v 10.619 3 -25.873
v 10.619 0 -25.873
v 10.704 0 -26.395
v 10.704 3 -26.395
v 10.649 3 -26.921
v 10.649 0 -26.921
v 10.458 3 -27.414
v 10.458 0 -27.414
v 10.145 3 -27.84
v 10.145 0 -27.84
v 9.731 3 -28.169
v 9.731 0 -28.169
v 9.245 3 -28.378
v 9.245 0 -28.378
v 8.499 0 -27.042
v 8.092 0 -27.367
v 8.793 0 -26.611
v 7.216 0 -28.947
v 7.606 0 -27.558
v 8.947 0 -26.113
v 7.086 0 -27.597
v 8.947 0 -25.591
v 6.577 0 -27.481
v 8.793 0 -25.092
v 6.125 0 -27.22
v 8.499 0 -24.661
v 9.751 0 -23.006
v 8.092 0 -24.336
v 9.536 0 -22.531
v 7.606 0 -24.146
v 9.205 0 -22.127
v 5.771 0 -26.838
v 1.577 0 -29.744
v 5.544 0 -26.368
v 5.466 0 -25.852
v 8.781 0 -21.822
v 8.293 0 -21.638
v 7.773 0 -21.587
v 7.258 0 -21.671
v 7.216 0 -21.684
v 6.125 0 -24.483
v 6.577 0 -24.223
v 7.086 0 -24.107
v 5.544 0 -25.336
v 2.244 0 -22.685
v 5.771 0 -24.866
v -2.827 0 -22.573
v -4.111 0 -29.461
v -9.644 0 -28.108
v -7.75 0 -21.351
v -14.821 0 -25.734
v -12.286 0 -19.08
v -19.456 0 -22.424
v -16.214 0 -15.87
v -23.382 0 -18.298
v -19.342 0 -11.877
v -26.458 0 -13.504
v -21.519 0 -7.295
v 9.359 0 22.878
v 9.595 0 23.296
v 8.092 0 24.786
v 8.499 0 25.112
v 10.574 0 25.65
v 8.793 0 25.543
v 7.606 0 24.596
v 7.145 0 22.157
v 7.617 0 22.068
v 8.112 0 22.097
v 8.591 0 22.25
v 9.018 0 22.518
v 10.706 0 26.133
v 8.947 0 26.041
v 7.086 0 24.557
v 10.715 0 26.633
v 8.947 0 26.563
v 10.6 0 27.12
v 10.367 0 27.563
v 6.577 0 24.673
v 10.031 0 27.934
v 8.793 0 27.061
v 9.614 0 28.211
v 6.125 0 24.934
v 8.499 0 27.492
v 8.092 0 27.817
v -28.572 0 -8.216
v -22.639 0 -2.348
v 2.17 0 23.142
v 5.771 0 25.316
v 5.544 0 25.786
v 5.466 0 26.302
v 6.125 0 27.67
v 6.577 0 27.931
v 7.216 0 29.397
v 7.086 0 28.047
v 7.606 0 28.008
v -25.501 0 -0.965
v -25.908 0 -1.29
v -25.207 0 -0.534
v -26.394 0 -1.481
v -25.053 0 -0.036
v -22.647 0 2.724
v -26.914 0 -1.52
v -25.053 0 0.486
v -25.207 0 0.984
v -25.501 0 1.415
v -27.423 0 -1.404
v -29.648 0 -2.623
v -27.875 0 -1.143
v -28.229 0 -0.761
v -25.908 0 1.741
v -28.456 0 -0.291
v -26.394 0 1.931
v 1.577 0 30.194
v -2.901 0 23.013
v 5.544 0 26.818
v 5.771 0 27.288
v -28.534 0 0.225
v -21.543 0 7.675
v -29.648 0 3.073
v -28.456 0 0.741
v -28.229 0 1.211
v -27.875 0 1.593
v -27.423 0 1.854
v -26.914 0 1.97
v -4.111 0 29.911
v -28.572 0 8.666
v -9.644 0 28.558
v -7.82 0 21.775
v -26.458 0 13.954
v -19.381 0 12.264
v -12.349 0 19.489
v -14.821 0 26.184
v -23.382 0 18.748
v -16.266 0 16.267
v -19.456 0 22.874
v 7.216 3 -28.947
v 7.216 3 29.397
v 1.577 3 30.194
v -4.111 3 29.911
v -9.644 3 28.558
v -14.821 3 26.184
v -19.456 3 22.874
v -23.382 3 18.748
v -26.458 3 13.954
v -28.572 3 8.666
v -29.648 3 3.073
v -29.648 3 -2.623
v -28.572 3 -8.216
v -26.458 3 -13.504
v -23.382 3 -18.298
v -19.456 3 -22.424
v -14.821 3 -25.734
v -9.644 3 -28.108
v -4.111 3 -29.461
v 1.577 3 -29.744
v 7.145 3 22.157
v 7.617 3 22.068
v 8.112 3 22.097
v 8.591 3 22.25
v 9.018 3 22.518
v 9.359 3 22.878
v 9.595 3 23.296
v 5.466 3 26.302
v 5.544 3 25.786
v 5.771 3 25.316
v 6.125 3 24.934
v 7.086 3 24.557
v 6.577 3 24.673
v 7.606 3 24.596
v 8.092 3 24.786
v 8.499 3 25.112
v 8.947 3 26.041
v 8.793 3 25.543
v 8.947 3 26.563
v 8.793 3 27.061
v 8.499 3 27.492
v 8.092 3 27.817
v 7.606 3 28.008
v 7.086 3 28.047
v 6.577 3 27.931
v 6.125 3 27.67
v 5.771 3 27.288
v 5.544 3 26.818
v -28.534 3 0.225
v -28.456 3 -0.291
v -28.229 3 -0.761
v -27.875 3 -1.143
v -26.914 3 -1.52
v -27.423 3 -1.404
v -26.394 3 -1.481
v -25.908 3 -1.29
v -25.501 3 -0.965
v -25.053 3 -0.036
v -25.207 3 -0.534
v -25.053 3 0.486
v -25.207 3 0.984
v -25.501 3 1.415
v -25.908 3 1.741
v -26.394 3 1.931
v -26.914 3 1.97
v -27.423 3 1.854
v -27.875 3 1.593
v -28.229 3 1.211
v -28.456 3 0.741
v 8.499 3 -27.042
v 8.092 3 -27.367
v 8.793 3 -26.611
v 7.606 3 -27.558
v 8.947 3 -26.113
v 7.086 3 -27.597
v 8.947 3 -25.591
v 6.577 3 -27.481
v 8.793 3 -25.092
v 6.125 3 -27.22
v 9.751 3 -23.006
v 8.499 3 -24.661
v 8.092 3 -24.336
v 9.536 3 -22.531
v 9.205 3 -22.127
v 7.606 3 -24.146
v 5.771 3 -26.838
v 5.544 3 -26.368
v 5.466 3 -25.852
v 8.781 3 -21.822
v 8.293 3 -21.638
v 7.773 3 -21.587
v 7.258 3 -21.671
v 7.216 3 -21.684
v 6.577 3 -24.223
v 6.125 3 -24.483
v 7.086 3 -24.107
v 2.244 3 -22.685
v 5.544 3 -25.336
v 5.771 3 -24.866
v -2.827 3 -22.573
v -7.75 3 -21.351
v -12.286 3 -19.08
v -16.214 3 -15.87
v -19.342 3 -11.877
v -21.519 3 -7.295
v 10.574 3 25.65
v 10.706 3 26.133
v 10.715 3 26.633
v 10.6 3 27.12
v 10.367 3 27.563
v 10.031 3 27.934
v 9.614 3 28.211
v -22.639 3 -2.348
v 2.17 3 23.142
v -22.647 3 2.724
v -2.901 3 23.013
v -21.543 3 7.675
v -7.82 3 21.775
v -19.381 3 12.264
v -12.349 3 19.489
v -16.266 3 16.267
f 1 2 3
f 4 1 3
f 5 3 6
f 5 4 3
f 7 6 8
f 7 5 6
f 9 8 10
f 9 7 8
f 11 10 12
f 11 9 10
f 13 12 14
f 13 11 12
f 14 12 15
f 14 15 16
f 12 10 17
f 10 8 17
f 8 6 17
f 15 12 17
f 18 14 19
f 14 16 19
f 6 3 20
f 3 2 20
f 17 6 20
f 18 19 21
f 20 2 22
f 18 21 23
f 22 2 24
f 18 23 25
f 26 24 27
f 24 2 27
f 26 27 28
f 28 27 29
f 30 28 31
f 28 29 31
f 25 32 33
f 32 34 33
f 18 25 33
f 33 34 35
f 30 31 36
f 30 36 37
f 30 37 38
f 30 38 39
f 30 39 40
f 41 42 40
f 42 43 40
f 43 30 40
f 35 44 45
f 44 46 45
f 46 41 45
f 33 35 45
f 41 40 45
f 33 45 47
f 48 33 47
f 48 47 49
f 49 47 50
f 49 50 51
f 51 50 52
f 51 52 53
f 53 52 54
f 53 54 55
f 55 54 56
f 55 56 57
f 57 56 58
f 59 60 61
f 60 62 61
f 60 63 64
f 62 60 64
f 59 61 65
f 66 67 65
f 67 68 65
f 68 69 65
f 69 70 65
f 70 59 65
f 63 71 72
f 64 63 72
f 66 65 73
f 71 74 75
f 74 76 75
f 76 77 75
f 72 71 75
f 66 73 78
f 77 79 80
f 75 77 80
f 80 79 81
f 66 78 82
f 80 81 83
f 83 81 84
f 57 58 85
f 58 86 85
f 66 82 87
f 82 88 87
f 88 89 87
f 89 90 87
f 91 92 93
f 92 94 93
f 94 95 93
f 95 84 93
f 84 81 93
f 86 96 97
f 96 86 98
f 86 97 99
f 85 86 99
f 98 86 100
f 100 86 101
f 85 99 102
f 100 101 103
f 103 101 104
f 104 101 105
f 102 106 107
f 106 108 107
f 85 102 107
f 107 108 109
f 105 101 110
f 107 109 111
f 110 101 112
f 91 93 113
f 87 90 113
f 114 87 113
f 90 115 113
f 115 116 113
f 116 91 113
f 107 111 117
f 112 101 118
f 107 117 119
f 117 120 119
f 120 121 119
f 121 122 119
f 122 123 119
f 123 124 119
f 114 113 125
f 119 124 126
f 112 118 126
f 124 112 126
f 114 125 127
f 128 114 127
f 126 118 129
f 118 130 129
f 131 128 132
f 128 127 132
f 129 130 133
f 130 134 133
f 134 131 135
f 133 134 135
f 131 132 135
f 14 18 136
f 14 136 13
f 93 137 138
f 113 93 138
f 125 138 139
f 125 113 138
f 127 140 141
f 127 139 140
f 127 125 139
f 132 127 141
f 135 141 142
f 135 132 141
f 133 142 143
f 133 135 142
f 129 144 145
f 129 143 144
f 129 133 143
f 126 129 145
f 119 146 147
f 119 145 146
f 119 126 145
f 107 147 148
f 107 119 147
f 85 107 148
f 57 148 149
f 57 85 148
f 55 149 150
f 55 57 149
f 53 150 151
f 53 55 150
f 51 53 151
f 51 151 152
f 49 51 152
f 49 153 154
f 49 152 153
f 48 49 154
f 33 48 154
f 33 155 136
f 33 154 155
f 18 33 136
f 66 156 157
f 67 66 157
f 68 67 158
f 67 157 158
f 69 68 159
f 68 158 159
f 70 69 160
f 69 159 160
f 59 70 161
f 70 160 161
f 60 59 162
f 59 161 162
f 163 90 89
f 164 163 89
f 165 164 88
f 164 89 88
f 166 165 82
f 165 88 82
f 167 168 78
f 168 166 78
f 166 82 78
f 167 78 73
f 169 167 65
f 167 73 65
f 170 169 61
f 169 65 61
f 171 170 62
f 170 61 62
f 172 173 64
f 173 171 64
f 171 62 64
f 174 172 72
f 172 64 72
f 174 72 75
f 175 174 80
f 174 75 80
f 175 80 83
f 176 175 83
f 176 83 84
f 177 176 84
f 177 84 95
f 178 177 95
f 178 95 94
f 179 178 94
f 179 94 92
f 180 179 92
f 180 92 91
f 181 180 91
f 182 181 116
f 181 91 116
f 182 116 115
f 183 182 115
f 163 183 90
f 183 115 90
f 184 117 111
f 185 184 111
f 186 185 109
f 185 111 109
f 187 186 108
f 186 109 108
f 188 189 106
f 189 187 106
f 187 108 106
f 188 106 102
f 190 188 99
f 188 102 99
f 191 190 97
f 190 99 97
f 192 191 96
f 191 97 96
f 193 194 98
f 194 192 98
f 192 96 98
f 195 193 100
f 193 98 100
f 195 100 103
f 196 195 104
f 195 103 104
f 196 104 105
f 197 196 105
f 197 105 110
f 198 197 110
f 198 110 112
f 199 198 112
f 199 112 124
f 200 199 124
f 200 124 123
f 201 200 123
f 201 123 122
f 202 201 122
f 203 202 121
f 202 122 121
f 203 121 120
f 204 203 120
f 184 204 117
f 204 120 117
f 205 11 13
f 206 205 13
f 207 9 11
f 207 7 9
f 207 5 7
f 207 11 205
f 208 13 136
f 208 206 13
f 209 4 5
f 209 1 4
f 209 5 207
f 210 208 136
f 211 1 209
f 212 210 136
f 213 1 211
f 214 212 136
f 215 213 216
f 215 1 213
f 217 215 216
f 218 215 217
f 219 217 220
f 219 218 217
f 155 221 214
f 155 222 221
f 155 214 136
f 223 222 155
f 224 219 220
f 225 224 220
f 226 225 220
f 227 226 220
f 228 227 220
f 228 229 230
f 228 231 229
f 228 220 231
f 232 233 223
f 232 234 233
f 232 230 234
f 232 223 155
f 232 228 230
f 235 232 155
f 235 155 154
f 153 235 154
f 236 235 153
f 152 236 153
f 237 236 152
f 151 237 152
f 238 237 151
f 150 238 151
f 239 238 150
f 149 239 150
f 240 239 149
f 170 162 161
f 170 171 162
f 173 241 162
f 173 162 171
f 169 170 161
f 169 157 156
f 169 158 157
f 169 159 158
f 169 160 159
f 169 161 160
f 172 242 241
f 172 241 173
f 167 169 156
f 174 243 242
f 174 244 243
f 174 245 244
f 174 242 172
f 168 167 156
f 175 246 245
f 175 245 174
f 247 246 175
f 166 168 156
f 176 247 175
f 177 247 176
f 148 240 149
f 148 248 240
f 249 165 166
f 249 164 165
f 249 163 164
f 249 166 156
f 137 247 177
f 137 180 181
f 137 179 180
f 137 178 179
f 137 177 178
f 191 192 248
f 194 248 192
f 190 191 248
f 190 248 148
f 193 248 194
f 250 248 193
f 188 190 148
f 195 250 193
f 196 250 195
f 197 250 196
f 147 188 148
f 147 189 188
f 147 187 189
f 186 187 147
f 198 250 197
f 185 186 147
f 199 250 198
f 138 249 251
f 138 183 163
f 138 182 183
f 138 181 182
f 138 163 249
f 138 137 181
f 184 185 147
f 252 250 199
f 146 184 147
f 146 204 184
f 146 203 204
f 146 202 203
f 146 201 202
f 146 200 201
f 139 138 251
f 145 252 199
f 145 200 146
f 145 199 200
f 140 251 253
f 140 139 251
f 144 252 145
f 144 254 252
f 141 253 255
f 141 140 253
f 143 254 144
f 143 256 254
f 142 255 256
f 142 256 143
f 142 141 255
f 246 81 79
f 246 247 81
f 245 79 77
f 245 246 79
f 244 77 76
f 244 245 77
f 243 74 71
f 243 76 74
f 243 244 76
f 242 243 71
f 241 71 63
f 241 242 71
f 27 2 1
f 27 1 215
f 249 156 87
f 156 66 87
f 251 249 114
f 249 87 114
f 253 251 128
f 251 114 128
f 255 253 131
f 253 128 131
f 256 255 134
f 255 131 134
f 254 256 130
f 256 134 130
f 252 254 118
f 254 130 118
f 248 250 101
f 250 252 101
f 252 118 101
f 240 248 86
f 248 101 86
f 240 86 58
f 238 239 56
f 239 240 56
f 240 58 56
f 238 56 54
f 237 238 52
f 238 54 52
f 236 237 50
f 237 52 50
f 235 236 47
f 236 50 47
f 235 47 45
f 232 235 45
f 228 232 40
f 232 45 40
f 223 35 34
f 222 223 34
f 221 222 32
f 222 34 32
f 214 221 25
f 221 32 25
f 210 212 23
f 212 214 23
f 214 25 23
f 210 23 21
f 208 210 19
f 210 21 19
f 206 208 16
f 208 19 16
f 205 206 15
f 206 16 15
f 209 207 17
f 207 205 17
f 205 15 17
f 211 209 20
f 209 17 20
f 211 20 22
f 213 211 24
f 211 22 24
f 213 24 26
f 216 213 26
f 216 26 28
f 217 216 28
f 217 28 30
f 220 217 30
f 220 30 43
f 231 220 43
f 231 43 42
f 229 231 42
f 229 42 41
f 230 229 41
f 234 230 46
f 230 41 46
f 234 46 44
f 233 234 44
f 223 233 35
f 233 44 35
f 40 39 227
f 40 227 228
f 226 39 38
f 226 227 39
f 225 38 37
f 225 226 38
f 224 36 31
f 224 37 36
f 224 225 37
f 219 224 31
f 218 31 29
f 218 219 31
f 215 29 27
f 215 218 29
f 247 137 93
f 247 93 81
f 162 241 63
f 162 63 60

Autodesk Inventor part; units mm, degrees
ref_plane "YZ Plane" through (0, 0, 0) normal (1, 0, 0) x (0, 1, 0)
ref_plane "XZ Plane" through (0, 0, 0) normal (0, 1, 0) x (-1, 0, 0)
ref_plane "XY Plane" through (0, 0, 0) normal (0, 0, 1) x (1, 0, 0)
sketch "Sketch1" plane through (0, 0, 0) normal (0, 1, 0) x (-1, 0, 0)
  arc A0 (-7.2165, -28.9468) -> (-7.2165, 29.397) centre (-0.2165, 0.2251) ccw
  arc A1 (-7.2165, -25.8517) -> (-7.2165, 26.3019) centre (-0.2165, 0.2251) ccw construction
  arc A2 (-7.2165, -21.6838) -> (-7.2165, 22.134) centre (-0.2165, 0.2251) ccw
  line L0 (-7.2165, 33.9307) -> (-7.2165, -32.8883) construction
  circle A3 centre (-7.2165, 26.3019) radius 1.75
  circle A4 centre (-7.2165, -25.8517) radius 1.75
  circle A5 centre (26.7835, 0.2251) radius 1.75
  line L1 (-7.2165, 29.397) -> (-11.2926, 27.3801)
  line L2 (-11.2926, 27.3801) -> (-8.8324, 21.4622)
  line L3 (-8.8324, 21.4622) -> (-7.2165, 22.134)
  line L4 (-7.2165, -28.9468) -> (-11.2102, -27.8268)
  line L5 (-11.2102, -27.8268) -> (-9.1721, -21.092)
  line L6 (-9.1721, -21.092) -> (-7.2165, -21.6838)
  dimension "d14" = 54
  dimension "d16" = 46
  dimension "d17" = 30
  dimension "d19" = 3.5
  dimension "d20" = 3.5
  dimension "d21" = 7
  dimension "d22" = 3.5
extrude "Extrusion1" add sketch "Sketch1" along normal blind 3
fillet "Fillet1" radius 2 4 edges at (11.2926, 1.5, 27.3801) (8.8324, 1.5, 21.4622) (11.2102, 1.5, -27.8268) (9.1721, 1.5, -21.092)
properties part number "reverse gear reverse lever ring"
